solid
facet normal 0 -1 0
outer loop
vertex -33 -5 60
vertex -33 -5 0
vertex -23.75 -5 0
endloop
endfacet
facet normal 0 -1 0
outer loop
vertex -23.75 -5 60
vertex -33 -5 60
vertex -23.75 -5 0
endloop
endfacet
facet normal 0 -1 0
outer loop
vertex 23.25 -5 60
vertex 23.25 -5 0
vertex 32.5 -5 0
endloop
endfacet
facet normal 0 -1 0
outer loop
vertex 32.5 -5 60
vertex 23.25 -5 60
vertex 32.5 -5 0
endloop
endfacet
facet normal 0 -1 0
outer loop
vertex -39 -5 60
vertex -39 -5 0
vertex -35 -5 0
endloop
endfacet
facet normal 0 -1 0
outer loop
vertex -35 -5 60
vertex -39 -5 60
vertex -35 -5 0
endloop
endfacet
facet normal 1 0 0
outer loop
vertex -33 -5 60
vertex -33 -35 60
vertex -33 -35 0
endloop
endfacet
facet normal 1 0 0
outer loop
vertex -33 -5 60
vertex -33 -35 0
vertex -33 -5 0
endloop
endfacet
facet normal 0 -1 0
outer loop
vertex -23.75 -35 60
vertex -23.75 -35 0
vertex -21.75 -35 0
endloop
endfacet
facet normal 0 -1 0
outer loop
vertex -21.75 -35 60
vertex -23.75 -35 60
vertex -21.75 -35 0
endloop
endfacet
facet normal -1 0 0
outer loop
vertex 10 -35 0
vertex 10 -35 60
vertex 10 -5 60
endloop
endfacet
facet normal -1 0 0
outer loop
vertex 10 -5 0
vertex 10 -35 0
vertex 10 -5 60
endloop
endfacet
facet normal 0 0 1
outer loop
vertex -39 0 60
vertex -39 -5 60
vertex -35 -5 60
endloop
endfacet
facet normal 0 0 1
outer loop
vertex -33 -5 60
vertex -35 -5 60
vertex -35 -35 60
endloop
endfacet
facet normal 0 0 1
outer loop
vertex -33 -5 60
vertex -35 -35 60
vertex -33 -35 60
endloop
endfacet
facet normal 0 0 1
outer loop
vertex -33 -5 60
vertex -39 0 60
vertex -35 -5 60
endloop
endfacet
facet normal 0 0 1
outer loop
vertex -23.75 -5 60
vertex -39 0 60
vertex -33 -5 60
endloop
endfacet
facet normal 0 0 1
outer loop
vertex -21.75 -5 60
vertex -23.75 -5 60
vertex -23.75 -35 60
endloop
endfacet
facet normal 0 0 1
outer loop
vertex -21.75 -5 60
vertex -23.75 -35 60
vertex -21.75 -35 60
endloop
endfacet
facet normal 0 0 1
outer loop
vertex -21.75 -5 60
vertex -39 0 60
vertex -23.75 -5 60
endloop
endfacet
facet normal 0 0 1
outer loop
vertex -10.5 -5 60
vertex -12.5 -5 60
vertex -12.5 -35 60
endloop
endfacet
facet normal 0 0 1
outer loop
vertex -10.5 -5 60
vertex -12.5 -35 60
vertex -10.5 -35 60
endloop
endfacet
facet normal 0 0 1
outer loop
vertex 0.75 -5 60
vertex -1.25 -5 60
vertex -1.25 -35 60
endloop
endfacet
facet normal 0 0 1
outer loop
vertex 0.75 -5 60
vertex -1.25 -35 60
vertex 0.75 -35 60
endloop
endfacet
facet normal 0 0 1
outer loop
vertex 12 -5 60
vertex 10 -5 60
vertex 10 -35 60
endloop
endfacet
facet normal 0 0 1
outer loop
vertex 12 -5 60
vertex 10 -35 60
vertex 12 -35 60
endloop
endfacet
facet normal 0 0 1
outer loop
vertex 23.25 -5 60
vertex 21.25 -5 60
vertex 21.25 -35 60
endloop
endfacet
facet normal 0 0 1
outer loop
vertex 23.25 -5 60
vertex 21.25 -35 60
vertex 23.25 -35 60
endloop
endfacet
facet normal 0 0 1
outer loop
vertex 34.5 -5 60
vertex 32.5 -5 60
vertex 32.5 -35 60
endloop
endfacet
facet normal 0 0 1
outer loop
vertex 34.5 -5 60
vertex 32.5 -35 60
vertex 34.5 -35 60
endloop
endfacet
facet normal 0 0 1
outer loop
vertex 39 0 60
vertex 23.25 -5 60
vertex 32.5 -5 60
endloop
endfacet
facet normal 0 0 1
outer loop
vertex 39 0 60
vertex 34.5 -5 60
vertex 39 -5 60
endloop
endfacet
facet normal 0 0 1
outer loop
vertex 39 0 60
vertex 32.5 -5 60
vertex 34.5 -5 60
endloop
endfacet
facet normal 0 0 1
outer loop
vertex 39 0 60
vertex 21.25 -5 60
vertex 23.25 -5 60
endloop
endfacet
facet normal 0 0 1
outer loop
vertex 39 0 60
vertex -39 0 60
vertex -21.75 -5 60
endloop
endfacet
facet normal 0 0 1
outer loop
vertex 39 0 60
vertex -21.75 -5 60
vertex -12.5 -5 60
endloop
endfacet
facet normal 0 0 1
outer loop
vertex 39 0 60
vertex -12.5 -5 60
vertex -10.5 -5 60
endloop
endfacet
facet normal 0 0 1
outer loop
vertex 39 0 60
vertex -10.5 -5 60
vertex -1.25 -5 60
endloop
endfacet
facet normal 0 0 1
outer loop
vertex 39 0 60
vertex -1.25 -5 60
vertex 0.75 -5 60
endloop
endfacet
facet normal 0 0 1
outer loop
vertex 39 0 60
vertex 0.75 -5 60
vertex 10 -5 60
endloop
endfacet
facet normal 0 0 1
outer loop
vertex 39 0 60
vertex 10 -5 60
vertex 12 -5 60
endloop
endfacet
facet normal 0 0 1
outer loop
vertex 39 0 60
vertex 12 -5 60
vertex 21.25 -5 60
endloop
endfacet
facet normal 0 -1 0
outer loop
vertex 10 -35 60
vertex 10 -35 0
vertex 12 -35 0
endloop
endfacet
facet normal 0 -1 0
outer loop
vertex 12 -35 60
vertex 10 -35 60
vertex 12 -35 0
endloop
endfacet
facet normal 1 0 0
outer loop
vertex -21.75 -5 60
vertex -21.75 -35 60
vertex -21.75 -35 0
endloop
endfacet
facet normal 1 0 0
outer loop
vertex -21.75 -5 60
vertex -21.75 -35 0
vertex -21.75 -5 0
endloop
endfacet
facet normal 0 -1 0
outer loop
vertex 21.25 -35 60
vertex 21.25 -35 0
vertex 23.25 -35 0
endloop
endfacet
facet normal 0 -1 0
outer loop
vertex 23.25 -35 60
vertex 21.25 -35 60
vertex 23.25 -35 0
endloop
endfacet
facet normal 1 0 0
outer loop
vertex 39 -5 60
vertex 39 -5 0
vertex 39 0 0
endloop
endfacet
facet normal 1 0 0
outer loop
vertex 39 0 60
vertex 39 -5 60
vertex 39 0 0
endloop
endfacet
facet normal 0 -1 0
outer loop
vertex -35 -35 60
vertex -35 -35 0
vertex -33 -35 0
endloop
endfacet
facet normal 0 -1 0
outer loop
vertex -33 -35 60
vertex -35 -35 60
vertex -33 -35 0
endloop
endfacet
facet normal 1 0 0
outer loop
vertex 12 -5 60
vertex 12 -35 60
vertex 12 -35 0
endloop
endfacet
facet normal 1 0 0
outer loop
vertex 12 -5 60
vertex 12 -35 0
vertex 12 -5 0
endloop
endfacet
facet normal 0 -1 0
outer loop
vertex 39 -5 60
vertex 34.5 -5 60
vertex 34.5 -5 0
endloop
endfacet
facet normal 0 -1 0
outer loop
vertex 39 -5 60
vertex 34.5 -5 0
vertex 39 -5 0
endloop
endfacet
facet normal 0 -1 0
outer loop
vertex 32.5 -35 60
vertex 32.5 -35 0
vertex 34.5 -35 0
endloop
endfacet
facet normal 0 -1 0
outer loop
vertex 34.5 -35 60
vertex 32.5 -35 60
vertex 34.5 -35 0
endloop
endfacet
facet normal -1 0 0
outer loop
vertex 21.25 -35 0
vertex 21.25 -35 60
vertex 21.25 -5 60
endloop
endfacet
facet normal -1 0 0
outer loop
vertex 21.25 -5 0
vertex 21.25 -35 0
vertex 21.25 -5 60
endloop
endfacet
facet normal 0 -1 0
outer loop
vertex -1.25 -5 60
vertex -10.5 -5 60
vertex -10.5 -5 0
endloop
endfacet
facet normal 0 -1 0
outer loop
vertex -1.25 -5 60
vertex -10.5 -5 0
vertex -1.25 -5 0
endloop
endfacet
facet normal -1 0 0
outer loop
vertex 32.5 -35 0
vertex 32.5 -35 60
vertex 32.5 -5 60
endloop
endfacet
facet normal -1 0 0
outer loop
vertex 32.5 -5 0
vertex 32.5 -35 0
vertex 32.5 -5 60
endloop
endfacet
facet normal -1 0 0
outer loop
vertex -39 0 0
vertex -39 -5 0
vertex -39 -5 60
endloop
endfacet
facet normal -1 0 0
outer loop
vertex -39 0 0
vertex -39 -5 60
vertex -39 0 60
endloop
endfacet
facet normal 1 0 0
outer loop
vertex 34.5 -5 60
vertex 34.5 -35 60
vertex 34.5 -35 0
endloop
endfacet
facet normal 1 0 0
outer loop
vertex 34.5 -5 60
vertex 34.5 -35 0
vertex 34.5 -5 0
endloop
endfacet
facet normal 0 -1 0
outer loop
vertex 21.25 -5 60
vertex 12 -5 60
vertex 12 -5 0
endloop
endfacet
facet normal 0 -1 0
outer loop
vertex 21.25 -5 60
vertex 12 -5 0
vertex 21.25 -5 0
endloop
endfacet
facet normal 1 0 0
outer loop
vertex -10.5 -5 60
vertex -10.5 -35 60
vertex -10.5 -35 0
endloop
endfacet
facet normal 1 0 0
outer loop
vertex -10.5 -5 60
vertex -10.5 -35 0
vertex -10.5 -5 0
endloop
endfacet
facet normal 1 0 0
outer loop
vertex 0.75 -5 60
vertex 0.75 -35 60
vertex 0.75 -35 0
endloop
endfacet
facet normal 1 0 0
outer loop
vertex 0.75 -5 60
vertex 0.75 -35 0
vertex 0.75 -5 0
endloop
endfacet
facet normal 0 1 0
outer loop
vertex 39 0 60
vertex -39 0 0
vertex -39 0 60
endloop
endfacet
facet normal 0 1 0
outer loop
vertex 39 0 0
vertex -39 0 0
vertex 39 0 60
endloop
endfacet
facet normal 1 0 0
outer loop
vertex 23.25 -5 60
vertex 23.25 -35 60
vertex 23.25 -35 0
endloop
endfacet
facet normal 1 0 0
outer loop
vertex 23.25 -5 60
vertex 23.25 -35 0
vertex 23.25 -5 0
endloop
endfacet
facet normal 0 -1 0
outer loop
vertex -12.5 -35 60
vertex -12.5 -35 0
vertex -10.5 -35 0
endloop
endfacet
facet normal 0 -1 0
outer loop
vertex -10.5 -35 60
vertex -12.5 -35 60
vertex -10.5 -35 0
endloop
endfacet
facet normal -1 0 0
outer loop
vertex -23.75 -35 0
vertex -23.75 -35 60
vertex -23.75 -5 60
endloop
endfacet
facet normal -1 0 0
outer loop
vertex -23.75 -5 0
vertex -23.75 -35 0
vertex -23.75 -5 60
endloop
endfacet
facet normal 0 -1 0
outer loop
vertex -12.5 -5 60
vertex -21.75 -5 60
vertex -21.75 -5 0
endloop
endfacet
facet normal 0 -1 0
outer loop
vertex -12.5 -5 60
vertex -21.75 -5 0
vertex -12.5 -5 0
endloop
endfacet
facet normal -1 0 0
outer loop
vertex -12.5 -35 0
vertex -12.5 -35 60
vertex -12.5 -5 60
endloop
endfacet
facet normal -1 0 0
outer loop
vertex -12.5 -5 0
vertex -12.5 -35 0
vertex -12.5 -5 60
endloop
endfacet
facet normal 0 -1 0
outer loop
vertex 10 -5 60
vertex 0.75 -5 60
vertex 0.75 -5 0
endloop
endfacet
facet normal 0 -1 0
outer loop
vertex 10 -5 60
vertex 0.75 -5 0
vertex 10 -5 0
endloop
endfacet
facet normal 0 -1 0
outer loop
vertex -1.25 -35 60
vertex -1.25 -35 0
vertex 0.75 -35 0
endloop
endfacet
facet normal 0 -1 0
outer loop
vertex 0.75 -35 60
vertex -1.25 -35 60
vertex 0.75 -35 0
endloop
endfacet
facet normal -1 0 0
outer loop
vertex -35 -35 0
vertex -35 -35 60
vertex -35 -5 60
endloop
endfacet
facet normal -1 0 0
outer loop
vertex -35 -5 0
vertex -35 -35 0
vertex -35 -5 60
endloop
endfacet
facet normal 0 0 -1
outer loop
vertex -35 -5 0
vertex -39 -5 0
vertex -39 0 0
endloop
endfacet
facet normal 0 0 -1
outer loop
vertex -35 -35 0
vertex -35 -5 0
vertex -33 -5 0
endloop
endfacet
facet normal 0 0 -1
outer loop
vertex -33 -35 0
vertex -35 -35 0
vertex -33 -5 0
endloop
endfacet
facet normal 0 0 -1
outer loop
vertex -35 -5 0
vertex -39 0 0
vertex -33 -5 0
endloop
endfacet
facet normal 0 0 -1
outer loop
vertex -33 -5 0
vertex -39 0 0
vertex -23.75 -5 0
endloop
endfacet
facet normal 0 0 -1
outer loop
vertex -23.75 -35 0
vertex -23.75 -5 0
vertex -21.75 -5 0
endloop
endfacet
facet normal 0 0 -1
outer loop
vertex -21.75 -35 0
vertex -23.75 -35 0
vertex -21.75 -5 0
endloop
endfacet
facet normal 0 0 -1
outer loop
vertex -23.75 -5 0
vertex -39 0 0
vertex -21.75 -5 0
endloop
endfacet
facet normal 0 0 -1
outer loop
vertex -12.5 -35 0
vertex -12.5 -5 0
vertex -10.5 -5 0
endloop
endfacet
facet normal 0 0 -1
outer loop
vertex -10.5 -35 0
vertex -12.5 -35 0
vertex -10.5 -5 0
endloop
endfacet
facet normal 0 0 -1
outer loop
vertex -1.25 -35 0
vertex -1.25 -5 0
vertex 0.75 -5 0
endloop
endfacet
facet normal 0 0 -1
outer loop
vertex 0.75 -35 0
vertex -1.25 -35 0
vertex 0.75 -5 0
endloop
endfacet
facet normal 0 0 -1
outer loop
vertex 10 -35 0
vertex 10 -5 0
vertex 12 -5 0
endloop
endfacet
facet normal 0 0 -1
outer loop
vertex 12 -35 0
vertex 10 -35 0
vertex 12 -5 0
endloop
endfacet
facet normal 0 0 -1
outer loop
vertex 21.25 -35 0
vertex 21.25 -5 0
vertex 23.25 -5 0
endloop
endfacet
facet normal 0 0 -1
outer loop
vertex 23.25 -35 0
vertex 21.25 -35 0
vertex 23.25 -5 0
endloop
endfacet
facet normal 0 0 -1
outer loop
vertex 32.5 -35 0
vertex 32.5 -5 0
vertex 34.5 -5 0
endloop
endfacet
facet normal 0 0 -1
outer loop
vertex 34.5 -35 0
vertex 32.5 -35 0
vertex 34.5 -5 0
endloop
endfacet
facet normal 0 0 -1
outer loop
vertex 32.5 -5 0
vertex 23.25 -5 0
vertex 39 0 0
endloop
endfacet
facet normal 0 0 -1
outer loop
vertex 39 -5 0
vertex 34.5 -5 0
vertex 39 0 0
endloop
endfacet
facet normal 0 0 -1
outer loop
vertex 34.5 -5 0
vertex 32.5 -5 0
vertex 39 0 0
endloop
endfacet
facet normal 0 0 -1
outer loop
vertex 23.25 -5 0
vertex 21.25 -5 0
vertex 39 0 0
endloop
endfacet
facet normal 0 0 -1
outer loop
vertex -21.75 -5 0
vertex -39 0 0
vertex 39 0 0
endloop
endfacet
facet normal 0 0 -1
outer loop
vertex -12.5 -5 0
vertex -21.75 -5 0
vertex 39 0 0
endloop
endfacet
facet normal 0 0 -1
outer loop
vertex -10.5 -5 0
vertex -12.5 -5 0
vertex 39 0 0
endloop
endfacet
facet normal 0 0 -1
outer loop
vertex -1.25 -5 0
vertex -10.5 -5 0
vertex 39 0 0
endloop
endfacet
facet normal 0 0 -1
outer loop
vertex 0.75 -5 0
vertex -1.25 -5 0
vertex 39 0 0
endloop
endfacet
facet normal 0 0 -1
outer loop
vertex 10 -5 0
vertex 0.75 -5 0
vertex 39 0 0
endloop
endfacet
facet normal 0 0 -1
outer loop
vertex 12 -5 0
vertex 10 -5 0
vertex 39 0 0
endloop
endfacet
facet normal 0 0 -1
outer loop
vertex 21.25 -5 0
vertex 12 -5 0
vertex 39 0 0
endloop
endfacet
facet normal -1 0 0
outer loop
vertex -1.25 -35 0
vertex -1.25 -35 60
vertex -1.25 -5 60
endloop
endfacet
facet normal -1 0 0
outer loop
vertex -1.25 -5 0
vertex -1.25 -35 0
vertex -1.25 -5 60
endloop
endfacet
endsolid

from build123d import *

# Parameters (mm, degrees)
SKETCH001_W   = 78
SKETCH001_H   = 5
PAD001_DEPTH  = 60
SKETCH_W      = 2
SKETCH_H      = 30
PAD_DEPTH     = 60
ARRAY_X_COUNT = 7
ARRAY_X_PITCH = 11.25


with BuildPart() as pad001:
    # Sketch001 → Pad001 (new body)
    with BuildSketch(Plane.XY):
        with Locations((0, -2.5)):
            Rectangle(SKETCH001_W, SKETCH001_H)
    extrude(amount=PAD001_DEPTH)


with BuildPart() as fusion:
    # Sketch → Pad (new body)
    with BuildSketch(Plane.XY):
        with Locations((-34, -20)):
            Rectangle(SKETCH_W, SKETCH_H)
    extrude(amount=PAD_DEPTH)

    # Array X: Fusion ×7


with BuildPart() as fusion_1:
    add(fusion.part)
    with Locations(*[(i * ARRAY_X_PITCH, 0, 0) for i in range(1, ARRAY_X_COUNT)]):
        add(fusion.part)

    # Fusion: union Pad001
    add(pad001.part)


solid = fusion_1.part
